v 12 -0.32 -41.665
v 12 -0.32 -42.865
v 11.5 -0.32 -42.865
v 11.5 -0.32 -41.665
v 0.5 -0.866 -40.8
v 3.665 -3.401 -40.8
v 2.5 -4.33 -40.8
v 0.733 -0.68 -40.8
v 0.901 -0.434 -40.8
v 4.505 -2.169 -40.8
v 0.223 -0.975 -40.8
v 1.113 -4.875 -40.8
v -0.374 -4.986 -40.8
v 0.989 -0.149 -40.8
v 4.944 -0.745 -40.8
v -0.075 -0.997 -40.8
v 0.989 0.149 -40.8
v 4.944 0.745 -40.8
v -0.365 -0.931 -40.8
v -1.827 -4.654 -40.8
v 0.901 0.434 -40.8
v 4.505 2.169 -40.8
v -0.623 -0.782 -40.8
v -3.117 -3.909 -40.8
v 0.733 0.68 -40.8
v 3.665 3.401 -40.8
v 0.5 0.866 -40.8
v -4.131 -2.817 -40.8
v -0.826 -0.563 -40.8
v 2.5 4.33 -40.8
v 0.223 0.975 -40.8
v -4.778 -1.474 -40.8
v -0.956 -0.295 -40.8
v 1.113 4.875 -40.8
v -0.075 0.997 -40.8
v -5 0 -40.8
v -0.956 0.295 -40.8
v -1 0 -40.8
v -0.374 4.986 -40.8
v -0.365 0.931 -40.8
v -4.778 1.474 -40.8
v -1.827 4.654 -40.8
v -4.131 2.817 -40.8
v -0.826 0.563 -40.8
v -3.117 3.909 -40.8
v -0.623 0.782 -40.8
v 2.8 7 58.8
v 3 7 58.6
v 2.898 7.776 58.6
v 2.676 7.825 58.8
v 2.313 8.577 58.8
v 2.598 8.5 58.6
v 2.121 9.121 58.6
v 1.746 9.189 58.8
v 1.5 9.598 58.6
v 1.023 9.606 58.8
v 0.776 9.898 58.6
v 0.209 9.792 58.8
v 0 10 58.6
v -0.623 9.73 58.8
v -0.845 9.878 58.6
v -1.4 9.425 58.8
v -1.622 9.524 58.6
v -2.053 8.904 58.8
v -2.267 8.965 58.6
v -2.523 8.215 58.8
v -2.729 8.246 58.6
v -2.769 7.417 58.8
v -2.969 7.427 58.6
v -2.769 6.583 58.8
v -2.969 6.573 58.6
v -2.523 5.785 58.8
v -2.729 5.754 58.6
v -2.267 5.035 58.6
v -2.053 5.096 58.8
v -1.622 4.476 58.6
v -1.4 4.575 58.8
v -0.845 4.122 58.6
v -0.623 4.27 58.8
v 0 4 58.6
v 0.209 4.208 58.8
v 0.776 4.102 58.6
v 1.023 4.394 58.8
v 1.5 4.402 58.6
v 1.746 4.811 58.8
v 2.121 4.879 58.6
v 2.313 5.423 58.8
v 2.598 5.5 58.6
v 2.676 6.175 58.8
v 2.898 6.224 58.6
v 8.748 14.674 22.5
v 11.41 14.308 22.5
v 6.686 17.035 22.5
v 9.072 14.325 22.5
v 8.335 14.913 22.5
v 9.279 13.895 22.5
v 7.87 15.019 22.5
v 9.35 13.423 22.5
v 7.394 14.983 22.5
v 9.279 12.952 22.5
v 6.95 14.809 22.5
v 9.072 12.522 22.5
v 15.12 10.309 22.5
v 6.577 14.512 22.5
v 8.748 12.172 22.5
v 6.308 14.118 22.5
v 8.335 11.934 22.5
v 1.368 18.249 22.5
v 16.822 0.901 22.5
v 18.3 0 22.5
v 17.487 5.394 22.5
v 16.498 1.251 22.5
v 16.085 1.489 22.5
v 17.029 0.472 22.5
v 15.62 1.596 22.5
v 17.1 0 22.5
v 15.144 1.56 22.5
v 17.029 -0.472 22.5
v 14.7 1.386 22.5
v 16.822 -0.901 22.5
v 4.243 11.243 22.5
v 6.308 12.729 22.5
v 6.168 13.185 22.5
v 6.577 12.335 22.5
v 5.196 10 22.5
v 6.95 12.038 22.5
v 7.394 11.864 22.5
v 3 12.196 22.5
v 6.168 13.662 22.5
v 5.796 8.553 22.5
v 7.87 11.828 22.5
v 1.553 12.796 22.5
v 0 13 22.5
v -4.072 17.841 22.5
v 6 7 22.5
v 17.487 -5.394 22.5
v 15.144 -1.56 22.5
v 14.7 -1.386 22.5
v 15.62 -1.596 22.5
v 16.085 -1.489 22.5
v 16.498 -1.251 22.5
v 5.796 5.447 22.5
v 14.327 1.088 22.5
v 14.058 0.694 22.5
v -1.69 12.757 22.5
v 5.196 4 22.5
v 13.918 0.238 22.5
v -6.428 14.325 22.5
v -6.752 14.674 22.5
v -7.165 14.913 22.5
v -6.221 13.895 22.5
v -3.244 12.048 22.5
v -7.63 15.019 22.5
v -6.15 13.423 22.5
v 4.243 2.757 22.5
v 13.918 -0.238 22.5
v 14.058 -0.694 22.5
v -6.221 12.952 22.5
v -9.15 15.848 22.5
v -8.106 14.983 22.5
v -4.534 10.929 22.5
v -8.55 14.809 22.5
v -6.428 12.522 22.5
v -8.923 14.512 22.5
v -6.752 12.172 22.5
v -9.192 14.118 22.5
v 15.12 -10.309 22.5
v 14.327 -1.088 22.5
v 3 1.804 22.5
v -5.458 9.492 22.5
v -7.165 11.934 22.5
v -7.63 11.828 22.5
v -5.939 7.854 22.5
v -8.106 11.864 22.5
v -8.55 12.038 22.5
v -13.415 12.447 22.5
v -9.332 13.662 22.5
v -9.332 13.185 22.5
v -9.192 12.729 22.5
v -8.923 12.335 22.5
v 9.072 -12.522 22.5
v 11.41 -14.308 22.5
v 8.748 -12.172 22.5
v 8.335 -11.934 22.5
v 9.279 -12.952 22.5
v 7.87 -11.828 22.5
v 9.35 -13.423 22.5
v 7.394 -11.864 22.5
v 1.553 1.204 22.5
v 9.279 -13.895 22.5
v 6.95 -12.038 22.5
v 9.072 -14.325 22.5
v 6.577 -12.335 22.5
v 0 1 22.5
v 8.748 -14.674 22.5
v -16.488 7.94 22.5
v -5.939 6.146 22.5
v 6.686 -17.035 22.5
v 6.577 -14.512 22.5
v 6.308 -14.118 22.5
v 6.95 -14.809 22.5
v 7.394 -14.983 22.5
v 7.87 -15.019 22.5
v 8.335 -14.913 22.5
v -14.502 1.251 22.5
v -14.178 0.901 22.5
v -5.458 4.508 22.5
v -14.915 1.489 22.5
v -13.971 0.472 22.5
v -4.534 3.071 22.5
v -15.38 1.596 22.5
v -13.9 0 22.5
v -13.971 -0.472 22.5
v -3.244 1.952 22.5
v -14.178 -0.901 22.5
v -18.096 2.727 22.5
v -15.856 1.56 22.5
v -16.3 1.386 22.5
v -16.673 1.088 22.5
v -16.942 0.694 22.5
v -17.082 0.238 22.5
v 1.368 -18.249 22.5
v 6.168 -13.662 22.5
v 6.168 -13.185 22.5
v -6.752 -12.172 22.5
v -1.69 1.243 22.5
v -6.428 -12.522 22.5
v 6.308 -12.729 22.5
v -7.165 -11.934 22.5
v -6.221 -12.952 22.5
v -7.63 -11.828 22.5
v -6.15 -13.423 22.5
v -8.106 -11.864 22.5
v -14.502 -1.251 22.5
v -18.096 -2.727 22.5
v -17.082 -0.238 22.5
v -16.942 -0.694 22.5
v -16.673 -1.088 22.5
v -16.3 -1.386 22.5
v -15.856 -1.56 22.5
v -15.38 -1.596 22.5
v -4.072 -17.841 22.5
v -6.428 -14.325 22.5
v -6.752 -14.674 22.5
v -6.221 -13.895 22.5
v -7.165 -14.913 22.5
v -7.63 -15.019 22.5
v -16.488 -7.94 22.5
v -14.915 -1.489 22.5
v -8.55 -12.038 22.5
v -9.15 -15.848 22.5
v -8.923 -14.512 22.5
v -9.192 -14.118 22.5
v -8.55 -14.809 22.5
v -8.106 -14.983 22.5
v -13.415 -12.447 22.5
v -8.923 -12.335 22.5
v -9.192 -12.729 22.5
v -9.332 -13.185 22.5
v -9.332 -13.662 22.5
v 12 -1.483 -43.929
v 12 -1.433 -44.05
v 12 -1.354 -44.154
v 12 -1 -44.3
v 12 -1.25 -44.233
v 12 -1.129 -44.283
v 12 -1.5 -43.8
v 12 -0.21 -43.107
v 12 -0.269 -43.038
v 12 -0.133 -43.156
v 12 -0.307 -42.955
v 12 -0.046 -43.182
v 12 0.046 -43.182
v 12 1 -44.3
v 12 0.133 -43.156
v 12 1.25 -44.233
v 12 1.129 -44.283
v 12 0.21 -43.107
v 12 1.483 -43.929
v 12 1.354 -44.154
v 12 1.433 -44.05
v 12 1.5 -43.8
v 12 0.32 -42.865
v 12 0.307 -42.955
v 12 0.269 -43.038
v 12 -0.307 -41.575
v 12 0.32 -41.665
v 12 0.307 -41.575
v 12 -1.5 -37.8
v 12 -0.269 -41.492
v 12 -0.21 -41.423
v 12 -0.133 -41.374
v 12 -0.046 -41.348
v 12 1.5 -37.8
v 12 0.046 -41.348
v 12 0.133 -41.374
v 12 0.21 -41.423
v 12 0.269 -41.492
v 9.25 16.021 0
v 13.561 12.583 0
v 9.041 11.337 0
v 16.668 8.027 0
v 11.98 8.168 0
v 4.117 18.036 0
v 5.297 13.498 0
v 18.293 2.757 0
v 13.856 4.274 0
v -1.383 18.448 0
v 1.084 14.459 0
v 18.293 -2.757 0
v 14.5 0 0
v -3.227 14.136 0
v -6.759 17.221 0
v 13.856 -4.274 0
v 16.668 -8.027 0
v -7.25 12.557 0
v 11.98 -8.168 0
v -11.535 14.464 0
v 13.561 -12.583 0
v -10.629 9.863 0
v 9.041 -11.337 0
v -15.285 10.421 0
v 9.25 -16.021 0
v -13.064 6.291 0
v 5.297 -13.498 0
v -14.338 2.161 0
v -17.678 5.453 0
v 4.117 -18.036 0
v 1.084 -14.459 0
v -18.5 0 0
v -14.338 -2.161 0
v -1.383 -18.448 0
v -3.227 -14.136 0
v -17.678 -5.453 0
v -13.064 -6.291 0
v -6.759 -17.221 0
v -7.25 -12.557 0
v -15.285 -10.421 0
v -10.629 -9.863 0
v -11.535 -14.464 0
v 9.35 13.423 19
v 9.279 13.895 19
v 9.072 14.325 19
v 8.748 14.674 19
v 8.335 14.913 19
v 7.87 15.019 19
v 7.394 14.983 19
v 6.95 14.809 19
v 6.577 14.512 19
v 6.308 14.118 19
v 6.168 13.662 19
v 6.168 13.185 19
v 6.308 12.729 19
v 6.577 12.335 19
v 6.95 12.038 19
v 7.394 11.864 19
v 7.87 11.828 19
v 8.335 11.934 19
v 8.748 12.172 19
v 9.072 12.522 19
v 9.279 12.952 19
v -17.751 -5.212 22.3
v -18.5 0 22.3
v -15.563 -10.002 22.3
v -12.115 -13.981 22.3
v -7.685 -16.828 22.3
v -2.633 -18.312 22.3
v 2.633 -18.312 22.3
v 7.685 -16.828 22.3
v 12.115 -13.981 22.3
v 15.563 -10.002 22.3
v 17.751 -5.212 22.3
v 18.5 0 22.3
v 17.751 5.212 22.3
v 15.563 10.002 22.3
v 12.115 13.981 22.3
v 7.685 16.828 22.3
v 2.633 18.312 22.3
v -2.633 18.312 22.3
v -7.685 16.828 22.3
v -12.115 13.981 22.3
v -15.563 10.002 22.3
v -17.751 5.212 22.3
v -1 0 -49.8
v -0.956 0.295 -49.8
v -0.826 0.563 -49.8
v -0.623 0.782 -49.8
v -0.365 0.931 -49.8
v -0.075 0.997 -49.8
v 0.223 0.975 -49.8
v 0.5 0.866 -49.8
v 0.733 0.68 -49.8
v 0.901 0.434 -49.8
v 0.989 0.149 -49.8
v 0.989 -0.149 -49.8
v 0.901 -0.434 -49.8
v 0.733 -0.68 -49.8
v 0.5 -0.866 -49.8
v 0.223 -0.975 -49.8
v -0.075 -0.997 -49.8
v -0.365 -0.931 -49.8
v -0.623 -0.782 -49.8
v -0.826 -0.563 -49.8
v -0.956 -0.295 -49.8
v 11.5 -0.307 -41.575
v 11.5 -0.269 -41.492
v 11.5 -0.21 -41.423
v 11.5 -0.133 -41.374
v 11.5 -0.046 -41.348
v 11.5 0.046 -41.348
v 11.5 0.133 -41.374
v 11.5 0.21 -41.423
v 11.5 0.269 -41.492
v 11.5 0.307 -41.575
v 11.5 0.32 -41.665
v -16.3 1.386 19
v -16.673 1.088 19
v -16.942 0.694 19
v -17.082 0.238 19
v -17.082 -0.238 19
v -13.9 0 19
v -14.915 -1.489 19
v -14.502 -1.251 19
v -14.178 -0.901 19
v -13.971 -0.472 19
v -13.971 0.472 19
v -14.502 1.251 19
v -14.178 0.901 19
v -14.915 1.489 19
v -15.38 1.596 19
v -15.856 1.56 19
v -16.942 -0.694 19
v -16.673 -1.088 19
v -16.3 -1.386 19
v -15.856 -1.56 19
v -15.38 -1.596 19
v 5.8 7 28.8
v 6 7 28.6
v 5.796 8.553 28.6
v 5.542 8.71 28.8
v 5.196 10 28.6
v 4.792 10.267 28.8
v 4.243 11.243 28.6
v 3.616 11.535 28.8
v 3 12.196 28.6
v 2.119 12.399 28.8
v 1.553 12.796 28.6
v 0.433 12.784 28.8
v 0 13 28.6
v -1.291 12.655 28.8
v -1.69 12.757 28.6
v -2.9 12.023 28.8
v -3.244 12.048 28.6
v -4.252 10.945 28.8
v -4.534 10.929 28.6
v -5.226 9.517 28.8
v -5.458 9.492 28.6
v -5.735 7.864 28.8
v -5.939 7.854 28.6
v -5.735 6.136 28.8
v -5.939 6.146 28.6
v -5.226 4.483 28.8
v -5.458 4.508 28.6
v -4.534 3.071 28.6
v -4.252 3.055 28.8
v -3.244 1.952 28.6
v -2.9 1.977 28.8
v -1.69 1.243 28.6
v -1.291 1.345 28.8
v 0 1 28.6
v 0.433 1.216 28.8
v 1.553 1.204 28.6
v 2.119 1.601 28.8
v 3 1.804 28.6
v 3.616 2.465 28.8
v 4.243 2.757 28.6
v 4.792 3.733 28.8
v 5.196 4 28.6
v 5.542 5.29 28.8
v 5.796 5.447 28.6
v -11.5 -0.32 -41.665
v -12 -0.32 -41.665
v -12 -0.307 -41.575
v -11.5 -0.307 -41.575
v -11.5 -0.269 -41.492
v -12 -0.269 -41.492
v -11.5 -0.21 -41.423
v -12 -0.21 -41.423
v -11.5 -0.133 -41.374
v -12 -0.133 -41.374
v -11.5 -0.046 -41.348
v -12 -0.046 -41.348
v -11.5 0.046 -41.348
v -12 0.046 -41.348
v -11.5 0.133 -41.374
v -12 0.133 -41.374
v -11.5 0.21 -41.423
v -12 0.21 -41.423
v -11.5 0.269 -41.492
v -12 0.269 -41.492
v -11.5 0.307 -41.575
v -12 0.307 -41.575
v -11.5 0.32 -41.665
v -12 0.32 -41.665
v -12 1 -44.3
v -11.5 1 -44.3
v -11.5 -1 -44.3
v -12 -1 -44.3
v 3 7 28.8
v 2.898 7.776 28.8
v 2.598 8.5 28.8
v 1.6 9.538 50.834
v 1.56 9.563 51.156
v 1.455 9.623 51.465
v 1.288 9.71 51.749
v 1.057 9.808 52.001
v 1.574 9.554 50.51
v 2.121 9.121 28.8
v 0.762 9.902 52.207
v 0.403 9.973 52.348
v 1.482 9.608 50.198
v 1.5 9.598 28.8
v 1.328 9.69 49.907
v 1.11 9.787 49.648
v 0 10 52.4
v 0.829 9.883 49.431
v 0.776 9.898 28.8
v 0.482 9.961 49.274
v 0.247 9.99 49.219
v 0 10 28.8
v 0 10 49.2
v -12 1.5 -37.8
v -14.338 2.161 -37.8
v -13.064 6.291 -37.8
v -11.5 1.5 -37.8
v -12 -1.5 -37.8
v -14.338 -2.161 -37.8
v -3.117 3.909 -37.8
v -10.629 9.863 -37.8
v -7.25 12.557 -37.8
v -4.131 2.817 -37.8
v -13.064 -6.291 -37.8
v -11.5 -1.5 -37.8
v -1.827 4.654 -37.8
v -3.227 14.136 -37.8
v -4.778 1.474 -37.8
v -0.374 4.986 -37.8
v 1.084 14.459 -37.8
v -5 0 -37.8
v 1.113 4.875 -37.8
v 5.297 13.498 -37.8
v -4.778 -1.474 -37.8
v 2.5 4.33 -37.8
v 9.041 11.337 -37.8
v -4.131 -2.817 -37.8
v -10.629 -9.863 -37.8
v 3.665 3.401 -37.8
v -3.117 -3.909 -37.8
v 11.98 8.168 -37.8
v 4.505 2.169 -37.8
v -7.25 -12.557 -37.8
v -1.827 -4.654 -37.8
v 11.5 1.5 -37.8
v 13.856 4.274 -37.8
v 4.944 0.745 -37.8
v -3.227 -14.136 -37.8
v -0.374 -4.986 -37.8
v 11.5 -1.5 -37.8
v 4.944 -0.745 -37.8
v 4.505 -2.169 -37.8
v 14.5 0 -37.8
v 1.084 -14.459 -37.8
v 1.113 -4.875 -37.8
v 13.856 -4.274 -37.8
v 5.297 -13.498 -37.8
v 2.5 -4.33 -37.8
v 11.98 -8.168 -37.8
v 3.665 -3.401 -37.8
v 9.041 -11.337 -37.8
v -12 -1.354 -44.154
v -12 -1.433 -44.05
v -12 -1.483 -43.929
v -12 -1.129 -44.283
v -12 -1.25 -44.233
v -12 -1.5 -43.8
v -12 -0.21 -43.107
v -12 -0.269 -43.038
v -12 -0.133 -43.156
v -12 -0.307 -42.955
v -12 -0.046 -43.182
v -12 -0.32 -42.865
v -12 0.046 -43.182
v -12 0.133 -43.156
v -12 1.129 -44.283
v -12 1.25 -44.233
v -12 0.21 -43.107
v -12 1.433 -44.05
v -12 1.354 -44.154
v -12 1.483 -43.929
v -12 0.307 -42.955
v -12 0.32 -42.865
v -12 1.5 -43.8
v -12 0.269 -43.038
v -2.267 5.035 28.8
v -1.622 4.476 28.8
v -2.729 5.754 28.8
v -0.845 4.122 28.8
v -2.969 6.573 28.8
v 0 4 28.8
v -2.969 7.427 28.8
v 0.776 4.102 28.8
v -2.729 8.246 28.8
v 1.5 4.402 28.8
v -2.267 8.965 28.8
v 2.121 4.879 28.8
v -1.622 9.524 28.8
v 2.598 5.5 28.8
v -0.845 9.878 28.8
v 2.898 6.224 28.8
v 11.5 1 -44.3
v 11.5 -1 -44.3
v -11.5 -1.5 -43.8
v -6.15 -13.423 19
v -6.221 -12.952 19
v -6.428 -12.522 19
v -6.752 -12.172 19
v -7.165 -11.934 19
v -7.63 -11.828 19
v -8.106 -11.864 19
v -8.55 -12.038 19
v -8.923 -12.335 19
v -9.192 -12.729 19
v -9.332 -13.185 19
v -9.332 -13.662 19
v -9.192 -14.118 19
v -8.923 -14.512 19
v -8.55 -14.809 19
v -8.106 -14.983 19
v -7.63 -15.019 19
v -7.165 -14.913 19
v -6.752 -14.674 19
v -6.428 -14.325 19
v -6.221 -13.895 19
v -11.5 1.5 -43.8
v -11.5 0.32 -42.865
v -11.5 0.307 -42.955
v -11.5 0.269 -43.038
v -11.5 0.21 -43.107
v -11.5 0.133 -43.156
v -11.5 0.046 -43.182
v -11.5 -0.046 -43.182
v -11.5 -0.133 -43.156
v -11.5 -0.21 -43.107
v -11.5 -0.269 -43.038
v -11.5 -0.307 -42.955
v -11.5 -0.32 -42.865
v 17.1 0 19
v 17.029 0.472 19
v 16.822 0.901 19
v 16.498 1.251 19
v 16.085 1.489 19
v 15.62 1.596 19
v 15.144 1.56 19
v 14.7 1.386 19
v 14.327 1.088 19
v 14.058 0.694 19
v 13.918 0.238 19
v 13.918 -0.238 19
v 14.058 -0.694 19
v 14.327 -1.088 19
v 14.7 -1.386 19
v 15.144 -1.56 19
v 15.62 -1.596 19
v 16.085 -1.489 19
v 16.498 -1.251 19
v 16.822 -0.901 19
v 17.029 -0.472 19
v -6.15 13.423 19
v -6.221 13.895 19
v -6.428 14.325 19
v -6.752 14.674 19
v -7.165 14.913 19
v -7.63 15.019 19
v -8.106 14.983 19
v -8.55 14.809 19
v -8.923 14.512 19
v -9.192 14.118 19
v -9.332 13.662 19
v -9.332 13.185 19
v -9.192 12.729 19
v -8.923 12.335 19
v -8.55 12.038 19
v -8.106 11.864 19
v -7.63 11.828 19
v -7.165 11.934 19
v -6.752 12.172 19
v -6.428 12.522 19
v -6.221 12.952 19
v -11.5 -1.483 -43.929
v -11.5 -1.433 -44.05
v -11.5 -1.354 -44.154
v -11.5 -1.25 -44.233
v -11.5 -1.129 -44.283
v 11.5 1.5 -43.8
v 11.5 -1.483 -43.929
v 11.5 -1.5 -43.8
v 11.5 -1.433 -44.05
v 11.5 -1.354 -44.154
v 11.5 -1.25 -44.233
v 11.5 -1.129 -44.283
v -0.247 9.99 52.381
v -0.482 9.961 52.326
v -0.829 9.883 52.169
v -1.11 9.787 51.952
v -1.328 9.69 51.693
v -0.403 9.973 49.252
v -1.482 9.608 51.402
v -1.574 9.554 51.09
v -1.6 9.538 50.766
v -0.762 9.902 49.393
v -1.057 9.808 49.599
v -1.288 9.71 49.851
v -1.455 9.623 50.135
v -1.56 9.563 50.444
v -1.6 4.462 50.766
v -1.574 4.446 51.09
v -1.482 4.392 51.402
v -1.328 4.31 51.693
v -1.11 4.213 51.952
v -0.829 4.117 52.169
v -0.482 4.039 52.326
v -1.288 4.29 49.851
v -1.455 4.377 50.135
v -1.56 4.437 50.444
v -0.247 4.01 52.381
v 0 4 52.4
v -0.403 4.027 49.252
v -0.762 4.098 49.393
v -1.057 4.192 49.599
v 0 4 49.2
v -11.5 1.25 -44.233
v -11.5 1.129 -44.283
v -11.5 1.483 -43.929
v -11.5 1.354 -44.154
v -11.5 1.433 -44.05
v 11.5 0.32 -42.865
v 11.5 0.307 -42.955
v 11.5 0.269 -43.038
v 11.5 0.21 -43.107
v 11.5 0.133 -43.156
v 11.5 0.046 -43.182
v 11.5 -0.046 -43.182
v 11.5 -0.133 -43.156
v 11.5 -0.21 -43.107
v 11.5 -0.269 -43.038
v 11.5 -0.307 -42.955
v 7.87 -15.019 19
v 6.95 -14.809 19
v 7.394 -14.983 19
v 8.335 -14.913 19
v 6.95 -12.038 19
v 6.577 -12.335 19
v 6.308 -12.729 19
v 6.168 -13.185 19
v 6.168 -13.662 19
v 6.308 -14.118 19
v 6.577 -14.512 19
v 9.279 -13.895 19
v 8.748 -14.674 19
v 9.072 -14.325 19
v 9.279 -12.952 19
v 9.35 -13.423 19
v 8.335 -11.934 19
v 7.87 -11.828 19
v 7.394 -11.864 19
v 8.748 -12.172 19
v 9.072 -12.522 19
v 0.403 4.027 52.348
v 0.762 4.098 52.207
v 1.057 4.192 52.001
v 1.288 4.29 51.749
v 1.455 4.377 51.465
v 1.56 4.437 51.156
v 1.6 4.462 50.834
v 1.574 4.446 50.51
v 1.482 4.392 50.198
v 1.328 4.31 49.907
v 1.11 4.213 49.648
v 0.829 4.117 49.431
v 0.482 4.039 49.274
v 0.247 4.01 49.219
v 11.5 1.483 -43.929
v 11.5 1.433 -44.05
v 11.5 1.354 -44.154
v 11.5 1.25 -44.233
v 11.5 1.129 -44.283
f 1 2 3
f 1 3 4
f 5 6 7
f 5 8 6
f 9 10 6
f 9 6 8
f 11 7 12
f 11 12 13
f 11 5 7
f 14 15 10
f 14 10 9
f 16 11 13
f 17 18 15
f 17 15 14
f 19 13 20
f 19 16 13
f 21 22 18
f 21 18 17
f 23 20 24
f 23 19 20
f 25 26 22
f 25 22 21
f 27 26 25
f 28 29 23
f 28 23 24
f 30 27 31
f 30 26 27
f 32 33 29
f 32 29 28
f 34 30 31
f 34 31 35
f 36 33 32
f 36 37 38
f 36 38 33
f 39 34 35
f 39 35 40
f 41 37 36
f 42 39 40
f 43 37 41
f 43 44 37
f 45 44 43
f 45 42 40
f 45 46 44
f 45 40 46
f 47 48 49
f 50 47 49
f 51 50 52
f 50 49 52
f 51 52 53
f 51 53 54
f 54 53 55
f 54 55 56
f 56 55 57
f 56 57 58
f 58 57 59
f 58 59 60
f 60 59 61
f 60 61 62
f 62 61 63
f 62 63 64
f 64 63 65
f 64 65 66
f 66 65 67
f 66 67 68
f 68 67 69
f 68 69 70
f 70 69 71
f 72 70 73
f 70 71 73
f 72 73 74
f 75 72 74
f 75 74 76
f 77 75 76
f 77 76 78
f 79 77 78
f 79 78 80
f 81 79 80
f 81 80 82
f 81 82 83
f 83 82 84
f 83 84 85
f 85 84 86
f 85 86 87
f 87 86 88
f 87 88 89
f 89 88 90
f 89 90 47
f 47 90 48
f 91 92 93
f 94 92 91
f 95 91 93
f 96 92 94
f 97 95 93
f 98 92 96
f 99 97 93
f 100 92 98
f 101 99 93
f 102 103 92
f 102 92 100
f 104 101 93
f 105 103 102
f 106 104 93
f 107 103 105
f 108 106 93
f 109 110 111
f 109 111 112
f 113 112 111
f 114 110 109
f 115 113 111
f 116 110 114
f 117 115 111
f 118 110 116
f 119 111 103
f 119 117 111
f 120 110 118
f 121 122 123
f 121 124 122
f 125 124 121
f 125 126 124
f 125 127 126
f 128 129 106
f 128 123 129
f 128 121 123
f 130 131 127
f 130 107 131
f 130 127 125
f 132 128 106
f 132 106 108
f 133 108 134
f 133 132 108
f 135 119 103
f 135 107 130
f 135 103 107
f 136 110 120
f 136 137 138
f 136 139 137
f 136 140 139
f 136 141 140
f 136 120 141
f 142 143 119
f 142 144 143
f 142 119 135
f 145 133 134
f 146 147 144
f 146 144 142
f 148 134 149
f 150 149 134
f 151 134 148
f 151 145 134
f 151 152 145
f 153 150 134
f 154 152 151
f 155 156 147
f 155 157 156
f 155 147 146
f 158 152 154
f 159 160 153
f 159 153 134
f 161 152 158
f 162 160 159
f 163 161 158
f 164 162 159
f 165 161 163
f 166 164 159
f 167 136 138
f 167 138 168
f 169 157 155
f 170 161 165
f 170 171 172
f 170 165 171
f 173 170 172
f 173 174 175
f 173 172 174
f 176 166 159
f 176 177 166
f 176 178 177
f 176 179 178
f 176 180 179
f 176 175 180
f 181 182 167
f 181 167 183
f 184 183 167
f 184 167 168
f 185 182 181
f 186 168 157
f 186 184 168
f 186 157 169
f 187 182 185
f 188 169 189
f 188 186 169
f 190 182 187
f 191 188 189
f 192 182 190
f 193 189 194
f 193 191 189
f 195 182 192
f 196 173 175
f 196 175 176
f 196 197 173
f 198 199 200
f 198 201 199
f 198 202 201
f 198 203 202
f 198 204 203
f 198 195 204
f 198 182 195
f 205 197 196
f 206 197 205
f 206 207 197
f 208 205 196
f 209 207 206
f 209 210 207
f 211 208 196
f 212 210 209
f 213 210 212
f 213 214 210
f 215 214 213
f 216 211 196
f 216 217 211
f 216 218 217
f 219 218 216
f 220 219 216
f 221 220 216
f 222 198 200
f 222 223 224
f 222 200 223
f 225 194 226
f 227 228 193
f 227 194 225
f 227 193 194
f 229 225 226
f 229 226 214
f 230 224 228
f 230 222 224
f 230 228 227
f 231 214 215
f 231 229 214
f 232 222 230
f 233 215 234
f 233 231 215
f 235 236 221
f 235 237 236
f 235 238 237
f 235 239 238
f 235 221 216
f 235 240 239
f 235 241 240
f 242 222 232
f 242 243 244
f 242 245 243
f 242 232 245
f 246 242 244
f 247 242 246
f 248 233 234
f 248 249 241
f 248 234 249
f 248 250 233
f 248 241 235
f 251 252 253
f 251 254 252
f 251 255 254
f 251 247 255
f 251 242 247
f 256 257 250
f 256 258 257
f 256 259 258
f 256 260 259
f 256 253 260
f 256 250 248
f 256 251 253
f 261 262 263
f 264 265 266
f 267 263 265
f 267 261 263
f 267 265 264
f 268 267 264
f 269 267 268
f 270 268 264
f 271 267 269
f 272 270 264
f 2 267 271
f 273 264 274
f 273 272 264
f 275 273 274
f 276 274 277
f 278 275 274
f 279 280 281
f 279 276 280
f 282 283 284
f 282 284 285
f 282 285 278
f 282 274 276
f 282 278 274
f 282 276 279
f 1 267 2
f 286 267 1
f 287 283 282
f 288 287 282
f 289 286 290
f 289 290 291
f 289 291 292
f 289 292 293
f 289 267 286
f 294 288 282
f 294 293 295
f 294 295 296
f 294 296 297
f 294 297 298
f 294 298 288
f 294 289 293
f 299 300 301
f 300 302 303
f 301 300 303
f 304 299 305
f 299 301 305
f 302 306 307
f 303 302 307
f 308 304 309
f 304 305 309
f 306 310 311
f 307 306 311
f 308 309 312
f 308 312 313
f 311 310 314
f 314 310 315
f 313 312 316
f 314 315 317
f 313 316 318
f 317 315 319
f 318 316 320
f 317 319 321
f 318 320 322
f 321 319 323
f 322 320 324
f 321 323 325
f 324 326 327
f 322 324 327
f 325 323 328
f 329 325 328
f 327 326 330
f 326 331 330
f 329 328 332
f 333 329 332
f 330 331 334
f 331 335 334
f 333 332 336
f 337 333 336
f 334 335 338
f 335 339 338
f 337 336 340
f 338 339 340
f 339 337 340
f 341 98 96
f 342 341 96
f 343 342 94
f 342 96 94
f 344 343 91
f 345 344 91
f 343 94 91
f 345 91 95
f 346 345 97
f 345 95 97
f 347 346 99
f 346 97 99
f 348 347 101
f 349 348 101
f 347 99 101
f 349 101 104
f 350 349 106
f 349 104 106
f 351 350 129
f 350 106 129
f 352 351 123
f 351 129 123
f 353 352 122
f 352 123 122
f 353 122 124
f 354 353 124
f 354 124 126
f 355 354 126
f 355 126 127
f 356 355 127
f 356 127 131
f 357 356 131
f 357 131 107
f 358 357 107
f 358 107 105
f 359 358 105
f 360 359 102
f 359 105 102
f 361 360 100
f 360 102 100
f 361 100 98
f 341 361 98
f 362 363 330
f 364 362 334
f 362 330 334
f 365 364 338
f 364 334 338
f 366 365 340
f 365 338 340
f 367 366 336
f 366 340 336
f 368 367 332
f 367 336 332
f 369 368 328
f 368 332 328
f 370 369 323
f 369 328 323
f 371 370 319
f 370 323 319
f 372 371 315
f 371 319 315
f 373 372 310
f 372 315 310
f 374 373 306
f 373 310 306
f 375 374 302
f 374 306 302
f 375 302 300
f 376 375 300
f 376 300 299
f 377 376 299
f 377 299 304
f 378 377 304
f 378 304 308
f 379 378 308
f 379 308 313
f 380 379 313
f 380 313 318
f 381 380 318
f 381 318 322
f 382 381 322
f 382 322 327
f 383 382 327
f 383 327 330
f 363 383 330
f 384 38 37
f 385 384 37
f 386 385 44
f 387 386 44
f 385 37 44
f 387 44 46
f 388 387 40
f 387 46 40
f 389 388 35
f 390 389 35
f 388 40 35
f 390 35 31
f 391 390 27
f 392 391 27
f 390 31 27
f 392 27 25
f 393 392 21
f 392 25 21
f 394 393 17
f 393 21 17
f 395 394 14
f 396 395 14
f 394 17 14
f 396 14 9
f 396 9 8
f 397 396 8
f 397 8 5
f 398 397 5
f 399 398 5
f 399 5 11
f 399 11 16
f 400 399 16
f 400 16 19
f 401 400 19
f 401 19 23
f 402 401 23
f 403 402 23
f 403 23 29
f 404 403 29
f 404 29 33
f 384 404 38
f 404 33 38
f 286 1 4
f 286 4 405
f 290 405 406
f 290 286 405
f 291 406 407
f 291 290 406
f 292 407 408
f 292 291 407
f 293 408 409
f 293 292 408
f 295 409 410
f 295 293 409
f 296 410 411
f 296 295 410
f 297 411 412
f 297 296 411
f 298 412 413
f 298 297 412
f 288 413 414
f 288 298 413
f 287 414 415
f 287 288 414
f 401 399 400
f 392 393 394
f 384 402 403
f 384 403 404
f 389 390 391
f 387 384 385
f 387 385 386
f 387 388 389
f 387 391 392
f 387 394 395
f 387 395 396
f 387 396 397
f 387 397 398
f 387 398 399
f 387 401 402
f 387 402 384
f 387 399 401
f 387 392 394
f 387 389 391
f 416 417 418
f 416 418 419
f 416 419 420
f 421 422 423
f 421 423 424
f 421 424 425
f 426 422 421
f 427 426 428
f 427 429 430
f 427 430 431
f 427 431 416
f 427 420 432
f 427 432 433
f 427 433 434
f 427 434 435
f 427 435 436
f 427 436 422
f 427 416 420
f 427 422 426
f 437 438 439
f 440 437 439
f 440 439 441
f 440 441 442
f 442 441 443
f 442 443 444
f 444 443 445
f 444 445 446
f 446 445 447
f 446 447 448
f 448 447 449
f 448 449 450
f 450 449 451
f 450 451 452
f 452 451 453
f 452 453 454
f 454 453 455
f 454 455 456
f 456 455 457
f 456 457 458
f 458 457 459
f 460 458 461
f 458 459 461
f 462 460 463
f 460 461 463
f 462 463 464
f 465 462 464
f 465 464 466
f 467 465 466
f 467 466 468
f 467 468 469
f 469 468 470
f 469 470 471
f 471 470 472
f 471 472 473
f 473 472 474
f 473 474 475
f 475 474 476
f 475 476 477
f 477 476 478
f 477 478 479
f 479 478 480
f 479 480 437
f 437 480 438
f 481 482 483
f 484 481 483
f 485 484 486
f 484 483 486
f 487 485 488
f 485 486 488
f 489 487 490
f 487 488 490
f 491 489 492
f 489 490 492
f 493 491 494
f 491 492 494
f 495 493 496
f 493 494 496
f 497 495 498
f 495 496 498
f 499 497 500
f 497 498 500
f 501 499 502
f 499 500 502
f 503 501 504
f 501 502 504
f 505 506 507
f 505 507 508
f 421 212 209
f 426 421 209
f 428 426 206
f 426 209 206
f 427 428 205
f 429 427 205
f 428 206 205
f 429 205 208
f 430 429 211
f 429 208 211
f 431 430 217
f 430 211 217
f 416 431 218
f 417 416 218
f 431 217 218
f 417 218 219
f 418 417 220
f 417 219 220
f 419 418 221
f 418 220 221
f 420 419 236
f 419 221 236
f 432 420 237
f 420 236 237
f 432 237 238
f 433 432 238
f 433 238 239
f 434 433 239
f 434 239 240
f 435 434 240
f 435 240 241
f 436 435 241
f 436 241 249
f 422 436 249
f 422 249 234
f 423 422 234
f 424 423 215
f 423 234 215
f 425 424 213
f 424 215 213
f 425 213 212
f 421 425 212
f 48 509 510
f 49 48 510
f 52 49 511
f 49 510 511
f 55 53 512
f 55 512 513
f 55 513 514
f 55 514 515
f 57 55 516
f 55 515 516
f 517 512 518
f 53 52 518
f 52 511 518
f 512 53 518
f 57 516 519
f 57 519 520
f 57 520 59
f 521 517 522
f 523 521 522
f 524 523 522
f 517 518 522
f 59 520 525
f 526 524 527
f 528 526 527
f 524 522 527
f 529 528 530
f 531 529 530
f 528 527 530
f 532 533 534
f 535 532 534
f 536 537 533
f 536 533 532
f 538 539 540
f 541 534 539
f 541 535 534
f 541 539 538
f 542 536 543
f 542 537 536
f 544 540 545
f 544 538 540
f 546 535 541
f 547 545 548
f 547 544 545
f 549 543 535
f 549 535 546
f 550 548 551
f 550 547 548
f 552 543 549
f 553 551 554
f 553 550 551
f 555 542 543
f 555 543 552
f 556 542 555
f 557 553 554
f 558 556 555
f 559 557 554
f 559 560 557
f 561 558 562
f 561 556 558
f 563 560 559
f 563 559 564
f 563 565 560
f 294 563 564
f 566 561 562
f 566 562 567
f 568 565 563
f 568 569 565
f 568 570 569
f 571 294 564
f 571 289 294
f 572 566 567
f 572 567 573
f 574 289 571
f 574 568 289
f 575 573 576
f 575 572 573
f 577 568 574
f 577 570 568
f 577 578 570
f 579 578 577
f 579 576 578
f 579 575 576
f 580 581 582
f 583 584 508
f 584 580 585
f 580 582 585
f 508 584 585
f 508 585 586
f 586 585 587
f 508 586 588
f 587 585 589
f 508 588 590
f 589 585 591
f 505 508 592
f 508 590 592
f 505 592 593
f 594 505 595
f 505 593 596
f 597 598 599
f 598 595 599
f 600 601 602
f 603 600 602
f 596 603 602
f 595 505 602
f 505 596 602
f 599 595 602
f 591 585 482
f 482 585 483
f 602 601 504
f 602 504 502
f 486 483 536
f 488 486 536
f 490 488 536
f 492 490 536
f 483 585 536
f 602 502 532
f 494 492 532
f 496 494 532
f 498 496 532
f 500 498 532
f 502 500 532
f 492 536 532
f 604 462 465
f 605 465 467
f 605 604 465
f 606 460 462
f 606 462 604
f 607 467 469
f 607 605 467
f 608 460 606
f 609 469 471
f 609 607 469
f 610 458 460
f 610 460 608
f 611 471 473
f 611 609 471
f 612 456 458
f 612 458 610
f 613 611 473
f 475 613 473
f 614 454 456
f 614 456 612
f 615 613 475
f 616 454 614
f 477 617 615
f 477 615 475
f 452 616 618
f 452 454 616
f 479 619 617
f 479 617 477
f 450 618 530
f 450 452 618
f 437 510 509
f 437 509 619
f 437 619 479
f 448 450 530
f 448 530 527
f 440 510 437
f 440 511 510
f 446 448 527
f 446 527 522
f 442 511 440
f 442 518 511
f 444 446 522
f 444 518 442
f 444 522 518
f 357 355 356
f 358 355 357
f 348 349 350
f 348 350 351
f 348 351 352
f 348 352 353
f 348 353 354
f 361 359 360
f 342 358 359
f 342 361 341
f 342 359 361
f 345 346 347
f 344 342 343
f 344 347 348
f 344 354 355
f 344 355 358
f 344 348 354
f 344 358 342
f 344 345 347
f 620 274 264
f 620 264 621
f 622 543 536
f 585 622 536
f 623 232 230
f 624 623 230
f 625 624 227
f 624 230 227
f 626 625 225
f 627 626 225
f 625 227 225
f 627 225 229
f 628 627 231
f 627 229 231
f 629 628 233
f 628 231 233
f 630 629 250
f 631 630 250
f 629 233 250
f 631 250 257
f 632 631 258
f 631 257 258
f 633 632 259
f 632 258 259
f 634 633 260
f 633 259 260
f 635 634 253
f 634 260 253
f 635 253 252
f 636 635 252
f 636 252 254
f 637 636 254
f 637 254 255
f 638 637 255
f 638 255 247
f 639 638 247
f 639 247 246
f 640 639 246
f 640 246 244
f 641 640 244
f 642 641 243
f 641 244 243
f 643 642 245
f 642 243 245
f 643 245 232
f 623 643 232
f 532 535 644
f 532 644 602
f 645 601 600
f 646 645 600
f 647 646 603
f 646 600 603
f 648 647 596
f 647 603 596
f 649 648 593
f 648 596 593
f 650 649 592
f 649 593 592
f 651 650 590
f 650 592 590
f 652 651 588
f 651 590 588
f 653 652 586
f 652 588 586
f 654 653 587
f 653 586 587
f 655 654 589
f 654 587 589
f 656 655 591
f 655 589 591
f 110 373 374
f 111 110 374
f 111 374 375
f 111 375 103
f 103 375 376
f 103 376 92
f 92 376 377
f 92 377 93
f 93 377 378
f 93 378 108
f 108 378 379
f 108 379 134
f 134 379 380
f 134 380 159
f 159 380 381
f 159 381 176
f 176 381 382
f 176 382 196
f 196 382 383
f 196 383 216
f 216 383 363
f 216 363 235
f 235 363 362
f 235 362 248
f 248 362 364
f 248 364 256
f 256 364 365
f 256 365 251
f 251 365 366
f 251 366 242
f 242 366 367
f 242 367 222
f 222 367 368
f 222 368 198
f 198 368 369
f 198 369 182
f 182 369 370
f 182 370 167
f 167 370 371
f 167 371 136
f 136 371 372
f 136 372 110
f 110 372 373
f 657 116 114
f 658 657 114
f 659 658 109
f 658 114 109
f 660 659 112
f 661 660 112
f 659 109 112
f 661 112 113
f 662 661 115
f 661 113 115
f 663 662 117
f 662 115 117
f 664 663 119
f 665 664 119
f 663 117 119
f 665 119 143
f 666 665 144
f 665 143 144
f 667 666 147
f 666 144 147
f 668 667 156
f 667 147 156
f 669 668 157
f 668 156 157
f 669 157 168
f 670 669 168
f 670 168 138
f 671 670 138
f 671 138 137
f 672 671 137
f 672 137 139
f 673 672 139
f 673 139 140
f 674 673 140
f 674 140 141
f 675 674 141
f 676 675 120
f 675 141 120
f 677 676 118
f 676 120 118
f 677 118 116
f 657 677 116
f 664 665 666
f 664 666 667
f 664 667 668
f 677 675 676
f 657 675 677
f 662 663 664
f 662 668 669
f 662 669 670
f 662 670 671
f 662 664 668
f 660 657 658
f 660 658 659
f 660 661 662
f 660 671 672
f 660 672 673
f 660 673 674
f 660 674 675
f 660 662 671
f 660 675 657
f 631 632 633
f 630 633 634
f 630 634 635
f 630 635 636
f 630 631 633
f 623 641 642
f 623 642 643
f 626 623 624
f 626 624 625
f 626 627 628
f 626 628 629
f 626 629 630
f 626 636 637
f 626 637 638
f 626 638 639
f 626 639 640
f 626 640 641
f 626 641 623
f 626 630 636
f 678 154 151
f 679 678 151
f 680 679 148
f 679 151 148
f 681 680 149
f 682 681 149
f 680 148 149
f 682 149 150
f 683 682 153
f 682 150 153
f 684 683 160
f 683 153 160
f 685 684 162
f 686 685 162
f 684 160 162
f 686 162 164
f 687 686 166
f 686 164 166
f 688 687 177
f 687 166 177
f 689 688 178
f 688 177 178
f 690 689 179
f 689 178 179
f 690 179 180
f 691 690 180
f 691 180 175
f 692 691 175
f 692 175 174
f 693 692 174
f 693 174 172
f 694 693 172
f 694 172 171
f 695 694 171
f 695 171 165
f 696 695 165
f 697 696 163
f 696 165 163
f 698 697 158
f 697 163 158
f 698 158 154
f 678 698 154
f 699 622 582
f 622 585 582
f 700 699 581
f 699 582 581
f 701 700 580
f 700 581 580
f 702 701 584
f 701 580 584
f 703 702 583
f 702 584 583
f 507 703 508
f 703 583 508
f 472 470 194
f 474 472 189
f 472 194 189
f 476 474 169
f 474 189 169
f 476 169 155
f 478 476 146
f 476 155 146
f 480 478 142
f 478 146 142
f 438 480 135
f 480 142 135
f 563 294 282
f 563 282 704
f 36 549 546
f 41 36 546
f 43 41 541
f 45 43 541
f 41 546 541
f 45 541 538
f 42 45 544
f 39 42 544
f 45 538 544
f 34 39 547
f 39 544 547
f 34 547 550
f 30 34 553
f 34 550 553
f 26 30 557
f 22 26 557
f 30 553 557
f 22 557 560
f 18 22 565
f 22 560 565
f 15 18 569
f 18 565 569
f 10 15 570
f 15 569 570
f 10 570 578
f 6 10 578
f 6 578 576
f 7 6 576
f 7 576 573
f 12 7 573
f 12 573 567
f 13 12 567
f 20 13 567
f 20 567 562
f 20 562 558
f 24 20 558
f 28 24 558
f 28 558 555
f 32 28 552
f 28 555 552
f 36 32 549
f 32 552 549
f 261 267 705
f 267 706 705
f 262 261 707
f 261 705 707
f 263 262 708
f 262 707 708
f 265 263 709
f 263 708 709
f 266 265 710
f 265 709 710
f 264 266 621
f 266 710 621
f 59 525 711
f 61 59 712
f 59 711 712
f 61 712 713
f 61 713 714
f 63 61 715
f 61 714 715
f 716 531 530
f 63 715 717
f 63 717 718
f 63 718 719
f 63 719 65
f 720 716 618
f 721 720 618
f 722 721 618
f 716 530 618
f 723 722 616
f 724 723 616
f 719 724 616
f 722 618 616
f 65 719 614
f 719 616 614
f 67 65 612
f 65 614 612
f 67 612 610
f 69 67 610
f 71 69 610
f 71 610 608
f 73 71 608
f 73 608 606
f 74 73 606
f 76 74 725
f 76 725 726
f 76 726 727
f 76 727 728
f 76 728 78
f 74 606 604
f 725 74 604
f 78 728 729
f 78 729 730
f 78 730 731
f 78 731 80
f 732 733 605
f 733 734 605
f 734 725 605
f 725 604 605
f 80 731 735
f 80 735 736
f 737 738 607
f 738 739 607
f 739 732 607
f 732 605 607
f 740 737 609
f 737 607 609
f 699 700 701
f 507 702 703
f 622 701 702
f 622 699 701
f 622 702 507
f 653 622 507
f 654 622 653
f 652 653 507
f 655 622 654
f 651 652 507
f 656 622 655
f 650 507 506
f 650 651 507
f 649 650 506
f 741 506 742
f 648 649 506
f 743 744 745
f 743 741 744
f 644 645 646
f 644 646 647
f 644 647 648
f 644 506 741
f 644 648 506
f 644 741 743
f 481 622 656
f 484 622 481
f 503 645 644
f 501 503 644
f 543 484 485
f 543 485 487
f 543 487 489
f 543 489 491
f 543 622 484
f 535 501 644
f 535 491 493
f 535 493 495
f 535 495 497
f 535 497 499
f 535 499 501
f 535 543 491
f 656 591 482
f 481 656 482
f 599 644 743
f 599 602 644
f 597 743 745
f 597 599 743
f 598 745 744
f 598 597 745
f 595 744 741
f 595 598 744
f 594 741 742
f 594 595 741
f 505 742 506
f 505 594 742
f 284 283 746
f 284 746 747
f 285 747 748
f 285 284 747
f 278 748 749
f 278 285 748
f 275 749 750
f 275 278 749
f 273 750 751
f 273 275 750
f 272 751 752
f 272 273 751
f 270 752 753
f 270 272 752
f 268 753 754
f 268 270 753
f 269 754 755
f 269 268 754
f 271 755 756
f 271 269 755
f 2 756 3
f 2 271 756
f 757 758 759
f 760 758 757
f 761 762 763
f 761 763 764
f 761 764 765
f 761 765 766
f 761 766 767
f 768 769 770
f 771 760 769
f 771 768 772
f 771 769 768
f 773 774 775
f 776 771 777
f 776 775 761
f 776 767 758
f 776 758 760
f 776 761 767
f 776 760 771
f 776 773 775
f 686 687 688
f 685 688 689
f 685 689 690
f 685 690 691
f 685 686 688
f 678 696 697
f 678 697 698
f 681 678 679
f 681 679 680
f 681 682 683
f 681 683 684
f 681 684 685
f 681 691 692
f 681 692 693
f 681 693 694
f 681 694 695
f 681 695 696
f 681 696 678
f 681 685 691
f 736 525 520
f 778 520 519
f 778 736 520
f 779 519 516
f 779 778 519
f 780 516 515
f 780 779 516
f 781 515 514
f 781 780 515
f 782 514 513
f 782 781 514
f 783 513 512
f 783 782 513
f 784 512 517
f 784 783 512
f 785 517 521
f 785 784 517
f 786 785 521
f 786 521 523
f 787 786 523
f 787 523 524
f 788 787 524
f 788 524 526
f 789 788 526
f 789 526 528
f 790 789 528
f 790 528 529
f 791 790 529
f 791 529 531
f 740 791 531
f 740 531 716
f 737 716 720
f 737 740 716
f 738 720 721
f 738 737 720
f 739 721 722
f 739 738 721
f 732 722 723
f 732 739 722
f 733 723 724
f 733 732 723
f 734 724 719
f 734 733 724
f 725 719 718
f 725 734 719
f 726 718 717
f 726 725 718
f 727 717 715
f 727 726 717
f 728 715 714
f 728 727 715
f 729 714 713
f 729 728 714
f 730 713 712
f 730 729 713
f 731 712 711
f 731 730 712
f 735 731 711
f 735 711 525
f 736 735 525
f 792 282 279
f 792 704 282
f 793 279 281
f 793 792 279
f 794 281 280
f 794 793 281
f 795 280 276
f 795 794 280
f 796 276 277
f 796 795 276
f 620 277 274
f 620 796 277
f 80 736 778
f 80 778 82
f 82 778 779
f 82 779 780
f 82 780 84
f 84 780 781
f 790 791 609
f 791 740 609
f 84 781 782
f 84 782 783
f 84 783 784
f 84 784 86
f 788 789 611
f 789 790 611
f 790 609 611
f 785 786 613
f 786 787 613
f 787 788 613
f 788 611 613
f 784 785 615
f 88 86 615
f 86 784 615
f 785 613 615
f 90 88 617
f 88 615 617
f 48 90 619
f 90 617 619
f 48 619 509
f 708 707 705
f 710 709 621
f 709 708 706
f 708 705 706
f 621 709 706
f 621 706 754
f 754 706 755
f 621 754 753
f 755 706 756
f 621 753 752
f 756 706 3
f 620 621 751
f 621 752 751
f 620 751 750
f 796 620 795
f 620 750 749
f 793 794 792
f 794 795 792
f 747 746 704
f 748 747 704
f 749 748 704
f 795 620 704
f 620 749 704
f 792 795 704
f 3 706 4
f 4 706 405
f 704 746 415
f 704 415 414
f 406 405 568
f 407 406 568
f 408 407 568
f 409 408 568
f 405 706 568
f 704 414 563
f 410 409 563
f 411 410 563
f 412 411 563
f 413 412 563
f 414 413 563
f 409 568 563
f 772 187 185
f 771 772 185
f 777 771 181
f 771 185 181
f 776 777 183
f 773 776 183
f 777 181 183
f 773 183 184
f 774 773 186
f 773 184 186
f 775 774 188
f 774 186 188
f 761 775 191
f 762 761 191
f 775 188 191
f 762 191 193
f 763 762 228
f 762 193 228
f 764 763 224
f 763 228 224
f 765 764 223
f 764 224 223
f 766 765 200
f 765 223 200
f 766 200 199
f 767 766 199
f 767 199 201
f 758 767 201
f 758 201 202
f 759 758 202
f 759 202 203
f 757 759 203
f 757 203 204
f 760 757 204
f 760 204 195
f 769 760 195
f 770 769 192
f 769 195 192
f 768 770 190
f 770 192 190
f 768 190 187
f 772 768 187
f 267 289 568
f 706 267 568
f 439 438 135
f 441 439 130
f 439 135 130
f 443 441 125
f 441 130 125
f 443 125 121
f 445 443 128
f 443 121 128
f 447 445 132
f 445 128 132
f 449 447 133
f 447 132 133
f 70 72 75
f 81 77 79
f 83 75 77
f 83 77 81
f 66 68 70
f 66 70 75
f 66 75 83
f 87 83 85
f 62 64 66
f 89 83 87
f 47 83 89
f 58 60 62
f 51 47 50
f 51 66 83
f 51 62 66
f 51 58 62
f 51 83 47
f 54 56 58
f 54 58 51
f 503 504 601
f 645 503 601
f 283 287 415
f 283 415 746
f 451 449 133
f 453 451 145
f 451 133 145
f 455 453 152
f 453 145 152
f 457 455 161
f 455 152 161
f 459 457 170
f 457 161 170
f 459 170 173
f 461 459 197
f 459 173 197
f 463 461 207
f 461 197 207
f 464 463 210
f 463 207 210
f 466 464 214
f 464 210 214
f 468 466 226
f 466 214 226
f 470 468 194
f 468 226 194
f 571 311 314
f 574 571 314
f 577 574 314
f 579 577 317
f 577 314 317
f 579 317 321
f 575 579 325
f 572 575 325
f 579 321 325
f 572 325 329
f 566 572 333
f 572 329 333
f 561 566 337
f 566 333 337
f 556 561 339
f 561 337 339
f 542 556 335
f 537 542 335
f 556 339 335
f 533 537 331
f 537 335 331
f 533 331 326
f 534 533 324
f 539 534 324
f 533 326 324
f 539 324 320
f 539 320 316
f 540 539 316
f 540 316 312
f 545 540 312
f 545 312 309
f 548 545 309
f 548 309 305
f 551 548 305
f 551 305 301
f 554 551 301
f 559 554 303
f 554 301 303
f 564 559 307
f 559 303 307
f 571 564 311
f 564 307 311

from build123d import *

# Parameters (mm, degrees)
SKETCH1_R               = 18.5
BOSS_EXTRUDE1_DEPTH     = 22.5
SKETCH2_R               = 1.6
CUT_EXTRUDE1_DEPTH      = 3.5
SKETCH3_R               = 3
BOSS_EXTRUDE2_DEPTH     = 36.3
SKETCH3_3_R             = 6
SKETCH3_3_R_2           = 3
BOSS_EXTRUDE3_DEPTH     = 6.3
SKETCH4_R               = 14.5
BOSS_EXTRUDE4_DEPTH     = 37.8
SKETCH5_R               = 5
BOSS_EXTRUDE5_DEPTH     = 3
SKETCH6_R               = 1
BOSS_EXTRUDE6_DEPTH     = 9
SKETCH7_W               = 0.5
SKETCH7_H               = 3
BOSS_EXTRUDE7_DEPTH     = 6.5
CUT_EXTRUDE2_DEPTH      = 0.5
FILLET1_R               = 0.5
CHAMFER1_SIZE           = 0.2
CUT_EXTRUDE3_DEPTH      = 67.7078706
CUT_EXTRUDE3_DEPTH_BACK = 67.7078706
SKETCH9_R               = 1.6


with BuildPart() as part:
    # Sketch1 → Boss-Extrude1 (new body)
    with BuildSketch(Plane.XY):
        Circle(SKETCH1_R)
    extrude(amount=BOSS_EXTRUDE1_DEPTH)

    # Sketch2 → Cut-Extrude1 (cut)
    with BuildSketch(Plane.XY.offset(22.5)):
        with Locations((-7.75, 13.423393759)):
            Circle(SKETCH2_R)
        with Locations((7.75, 13.423393759)):
            Circle(SKETCH2_R)
        with Locations((-15.5, 0)):
            Circle(SKETCH2_R)
        with Locations((-7.75, -13.423393759)):
            Circle(SKETCH2_R)
        with Locations((7.75, -13.423393759)):
            Circle(SKETCH2_R)
        with Locations((15.5, 0)):
            Circle(SKETCH2_R)
    extrude(amount=-CUT_EXTRUDE1_DEPTH, mode=Mode.SUBTRACT)

    # Sketch3 → Boss-Extrude2 (add)
    with BuildSketch(Plane.XY.offset(22.5)):
        with Locations((0, 7)):
            Circle(SKETCH3_R)
    extrude(amount=BOSS_EXTRUDE2_DEPTH)

    # Sketch3<3> → Boss-Extrude3 (add)
    with BuildSketch(Plane.XY.offset(22.5)):
        with Locations((0, 7)):
            Circle(SKETCH3_3_R)
        with Locations((0, 7)):
            Circle(SKETCH3_3_R_2, mode=Mode.SUBTRACT)
    extrude(amount=BOSS_EXTRUDE3_DEPTH)

    # Sketch4 → Boss-Extrude4 (add)
    with BuildSketch(Plane(origin=(0, 0, 0), x_dir=(-1, 0, 0), z_dir=(0, 0, -1))):
        Circle(SKETCH4_R)
    extrude(amount=BOSS_EXTRUDE4_DEPTH)

    # Sketch5 → Boss-Extrude5 (add)
    with BuildSketch(Plane(origin=(0, 0, -37.8), x_dir=(-1, 0, 0), z_dir=(0, 0, -1))):
        Circle(SKETCH5_R)
    extrude(amount=BOSS_EXTRUDE5_DEPTH)

    # Sketch6 → Boss-Extrude6 (add)
    with BuildSketch(Plane(origin=(0, 0, -40.8), x_dir=(-1, 0, 0), z_dir=(0, 0, -1))):
        Circle(SKETCH6_R)
    extrude(amount=BOSS_EXTRUDE6_DEPTH)

    # Sketch7 → Boss-Extrude7 (add)
    with BuildSketch(Plane(origin=(0, 0, -37.8), x_dir=(-1, 0, 0), z_dir=(0, 0, -1))):
        with Locations((-11.75, 0)):
            Rectangle(SKETCH7_W, SKETCH7_H)
        with Locations((11.75, 0)):
            Rectangle(SKETCH7_W, SKETCH7_H)
    extrude(amount=BOSS_EXTRUDE7_DEPTH)

    # Sketch8 → Cut-Extrude2 (cut)
    with BuildSketch(Plane(origin=(12, 0, 0), x_dir=(0, 0, -1), z_dir=(1, 0, 0))):
        with BuildLine():
            Line((42.865122037, -0.320114275), (41.665122037, -0.320114275))
            ThreePointArc((41.665122037, -0.320114275), (41.345007763, 0), (41.665122037, 0.320114275))
            Line((41.665122037, 0.320114275), (42.865122037, 0.320114275))
            ThreePointArc((42.865122037, 0.320114275), (43.185236312, 0), (42.865122037, -0.320114275))
        make_face()
    cut_extrude2 = extrude(amount=-CUT_EXTRUDE2_DEPTH, mode=Mode.SUBTRACT)

    # Mirror2: Cut-Extrude2 across plane
    add(cut_extrude2.mirror(Plane(origin=(0, 0, 0), x_dir=(0, 0, 1), z_dir=(1, 0, 0))), mode=Mode.SUBTRACT)

    # Fillet1
    fillet1_edges = [part.edges().sort_by_distance(p)[0] for p in [
        (-11.75, 1.5, -44.3),
        (-11.75, -1.5, -44.3),
        (11.75, 1.5, -44.3),
        (11.75, -1.5, -44.3),
    ]]
    fillet(fillet1_edges, radius=FILLET1_R)

    # Chamfer1
    chamfer1_edges = [part.edges().sort_by_distance(p)[0] for p in [
        (-18.5, 0, 22.5),
        (-6, 7, 28.8),
        (-3, 7, 58.8),
    ]]
    chamfer(chamfer1_edges, length=CHAMFER1_SIZE)

    # Sketch9 → Cut-Extrude3 (cut, two sides: drawn at the far end of the back side and taken through both)
    with BuildSketch(Plane(origin=(0, 7, 0), x_dir=(1, 0, 0), z_dir=(0, 1, 0)).offset(-CUT_EXTRUDE3_DEPTH_BACK)):
        with Locations((0, -50.8)):
            Circle(SKETCH9_R)
    extrude(amount=CUT_EXTRUDE3_DEPTH + CUT_EXTRUDE3_DEPTH_BACK, mode=Mode.SUBTRACT)


solid = part.part
